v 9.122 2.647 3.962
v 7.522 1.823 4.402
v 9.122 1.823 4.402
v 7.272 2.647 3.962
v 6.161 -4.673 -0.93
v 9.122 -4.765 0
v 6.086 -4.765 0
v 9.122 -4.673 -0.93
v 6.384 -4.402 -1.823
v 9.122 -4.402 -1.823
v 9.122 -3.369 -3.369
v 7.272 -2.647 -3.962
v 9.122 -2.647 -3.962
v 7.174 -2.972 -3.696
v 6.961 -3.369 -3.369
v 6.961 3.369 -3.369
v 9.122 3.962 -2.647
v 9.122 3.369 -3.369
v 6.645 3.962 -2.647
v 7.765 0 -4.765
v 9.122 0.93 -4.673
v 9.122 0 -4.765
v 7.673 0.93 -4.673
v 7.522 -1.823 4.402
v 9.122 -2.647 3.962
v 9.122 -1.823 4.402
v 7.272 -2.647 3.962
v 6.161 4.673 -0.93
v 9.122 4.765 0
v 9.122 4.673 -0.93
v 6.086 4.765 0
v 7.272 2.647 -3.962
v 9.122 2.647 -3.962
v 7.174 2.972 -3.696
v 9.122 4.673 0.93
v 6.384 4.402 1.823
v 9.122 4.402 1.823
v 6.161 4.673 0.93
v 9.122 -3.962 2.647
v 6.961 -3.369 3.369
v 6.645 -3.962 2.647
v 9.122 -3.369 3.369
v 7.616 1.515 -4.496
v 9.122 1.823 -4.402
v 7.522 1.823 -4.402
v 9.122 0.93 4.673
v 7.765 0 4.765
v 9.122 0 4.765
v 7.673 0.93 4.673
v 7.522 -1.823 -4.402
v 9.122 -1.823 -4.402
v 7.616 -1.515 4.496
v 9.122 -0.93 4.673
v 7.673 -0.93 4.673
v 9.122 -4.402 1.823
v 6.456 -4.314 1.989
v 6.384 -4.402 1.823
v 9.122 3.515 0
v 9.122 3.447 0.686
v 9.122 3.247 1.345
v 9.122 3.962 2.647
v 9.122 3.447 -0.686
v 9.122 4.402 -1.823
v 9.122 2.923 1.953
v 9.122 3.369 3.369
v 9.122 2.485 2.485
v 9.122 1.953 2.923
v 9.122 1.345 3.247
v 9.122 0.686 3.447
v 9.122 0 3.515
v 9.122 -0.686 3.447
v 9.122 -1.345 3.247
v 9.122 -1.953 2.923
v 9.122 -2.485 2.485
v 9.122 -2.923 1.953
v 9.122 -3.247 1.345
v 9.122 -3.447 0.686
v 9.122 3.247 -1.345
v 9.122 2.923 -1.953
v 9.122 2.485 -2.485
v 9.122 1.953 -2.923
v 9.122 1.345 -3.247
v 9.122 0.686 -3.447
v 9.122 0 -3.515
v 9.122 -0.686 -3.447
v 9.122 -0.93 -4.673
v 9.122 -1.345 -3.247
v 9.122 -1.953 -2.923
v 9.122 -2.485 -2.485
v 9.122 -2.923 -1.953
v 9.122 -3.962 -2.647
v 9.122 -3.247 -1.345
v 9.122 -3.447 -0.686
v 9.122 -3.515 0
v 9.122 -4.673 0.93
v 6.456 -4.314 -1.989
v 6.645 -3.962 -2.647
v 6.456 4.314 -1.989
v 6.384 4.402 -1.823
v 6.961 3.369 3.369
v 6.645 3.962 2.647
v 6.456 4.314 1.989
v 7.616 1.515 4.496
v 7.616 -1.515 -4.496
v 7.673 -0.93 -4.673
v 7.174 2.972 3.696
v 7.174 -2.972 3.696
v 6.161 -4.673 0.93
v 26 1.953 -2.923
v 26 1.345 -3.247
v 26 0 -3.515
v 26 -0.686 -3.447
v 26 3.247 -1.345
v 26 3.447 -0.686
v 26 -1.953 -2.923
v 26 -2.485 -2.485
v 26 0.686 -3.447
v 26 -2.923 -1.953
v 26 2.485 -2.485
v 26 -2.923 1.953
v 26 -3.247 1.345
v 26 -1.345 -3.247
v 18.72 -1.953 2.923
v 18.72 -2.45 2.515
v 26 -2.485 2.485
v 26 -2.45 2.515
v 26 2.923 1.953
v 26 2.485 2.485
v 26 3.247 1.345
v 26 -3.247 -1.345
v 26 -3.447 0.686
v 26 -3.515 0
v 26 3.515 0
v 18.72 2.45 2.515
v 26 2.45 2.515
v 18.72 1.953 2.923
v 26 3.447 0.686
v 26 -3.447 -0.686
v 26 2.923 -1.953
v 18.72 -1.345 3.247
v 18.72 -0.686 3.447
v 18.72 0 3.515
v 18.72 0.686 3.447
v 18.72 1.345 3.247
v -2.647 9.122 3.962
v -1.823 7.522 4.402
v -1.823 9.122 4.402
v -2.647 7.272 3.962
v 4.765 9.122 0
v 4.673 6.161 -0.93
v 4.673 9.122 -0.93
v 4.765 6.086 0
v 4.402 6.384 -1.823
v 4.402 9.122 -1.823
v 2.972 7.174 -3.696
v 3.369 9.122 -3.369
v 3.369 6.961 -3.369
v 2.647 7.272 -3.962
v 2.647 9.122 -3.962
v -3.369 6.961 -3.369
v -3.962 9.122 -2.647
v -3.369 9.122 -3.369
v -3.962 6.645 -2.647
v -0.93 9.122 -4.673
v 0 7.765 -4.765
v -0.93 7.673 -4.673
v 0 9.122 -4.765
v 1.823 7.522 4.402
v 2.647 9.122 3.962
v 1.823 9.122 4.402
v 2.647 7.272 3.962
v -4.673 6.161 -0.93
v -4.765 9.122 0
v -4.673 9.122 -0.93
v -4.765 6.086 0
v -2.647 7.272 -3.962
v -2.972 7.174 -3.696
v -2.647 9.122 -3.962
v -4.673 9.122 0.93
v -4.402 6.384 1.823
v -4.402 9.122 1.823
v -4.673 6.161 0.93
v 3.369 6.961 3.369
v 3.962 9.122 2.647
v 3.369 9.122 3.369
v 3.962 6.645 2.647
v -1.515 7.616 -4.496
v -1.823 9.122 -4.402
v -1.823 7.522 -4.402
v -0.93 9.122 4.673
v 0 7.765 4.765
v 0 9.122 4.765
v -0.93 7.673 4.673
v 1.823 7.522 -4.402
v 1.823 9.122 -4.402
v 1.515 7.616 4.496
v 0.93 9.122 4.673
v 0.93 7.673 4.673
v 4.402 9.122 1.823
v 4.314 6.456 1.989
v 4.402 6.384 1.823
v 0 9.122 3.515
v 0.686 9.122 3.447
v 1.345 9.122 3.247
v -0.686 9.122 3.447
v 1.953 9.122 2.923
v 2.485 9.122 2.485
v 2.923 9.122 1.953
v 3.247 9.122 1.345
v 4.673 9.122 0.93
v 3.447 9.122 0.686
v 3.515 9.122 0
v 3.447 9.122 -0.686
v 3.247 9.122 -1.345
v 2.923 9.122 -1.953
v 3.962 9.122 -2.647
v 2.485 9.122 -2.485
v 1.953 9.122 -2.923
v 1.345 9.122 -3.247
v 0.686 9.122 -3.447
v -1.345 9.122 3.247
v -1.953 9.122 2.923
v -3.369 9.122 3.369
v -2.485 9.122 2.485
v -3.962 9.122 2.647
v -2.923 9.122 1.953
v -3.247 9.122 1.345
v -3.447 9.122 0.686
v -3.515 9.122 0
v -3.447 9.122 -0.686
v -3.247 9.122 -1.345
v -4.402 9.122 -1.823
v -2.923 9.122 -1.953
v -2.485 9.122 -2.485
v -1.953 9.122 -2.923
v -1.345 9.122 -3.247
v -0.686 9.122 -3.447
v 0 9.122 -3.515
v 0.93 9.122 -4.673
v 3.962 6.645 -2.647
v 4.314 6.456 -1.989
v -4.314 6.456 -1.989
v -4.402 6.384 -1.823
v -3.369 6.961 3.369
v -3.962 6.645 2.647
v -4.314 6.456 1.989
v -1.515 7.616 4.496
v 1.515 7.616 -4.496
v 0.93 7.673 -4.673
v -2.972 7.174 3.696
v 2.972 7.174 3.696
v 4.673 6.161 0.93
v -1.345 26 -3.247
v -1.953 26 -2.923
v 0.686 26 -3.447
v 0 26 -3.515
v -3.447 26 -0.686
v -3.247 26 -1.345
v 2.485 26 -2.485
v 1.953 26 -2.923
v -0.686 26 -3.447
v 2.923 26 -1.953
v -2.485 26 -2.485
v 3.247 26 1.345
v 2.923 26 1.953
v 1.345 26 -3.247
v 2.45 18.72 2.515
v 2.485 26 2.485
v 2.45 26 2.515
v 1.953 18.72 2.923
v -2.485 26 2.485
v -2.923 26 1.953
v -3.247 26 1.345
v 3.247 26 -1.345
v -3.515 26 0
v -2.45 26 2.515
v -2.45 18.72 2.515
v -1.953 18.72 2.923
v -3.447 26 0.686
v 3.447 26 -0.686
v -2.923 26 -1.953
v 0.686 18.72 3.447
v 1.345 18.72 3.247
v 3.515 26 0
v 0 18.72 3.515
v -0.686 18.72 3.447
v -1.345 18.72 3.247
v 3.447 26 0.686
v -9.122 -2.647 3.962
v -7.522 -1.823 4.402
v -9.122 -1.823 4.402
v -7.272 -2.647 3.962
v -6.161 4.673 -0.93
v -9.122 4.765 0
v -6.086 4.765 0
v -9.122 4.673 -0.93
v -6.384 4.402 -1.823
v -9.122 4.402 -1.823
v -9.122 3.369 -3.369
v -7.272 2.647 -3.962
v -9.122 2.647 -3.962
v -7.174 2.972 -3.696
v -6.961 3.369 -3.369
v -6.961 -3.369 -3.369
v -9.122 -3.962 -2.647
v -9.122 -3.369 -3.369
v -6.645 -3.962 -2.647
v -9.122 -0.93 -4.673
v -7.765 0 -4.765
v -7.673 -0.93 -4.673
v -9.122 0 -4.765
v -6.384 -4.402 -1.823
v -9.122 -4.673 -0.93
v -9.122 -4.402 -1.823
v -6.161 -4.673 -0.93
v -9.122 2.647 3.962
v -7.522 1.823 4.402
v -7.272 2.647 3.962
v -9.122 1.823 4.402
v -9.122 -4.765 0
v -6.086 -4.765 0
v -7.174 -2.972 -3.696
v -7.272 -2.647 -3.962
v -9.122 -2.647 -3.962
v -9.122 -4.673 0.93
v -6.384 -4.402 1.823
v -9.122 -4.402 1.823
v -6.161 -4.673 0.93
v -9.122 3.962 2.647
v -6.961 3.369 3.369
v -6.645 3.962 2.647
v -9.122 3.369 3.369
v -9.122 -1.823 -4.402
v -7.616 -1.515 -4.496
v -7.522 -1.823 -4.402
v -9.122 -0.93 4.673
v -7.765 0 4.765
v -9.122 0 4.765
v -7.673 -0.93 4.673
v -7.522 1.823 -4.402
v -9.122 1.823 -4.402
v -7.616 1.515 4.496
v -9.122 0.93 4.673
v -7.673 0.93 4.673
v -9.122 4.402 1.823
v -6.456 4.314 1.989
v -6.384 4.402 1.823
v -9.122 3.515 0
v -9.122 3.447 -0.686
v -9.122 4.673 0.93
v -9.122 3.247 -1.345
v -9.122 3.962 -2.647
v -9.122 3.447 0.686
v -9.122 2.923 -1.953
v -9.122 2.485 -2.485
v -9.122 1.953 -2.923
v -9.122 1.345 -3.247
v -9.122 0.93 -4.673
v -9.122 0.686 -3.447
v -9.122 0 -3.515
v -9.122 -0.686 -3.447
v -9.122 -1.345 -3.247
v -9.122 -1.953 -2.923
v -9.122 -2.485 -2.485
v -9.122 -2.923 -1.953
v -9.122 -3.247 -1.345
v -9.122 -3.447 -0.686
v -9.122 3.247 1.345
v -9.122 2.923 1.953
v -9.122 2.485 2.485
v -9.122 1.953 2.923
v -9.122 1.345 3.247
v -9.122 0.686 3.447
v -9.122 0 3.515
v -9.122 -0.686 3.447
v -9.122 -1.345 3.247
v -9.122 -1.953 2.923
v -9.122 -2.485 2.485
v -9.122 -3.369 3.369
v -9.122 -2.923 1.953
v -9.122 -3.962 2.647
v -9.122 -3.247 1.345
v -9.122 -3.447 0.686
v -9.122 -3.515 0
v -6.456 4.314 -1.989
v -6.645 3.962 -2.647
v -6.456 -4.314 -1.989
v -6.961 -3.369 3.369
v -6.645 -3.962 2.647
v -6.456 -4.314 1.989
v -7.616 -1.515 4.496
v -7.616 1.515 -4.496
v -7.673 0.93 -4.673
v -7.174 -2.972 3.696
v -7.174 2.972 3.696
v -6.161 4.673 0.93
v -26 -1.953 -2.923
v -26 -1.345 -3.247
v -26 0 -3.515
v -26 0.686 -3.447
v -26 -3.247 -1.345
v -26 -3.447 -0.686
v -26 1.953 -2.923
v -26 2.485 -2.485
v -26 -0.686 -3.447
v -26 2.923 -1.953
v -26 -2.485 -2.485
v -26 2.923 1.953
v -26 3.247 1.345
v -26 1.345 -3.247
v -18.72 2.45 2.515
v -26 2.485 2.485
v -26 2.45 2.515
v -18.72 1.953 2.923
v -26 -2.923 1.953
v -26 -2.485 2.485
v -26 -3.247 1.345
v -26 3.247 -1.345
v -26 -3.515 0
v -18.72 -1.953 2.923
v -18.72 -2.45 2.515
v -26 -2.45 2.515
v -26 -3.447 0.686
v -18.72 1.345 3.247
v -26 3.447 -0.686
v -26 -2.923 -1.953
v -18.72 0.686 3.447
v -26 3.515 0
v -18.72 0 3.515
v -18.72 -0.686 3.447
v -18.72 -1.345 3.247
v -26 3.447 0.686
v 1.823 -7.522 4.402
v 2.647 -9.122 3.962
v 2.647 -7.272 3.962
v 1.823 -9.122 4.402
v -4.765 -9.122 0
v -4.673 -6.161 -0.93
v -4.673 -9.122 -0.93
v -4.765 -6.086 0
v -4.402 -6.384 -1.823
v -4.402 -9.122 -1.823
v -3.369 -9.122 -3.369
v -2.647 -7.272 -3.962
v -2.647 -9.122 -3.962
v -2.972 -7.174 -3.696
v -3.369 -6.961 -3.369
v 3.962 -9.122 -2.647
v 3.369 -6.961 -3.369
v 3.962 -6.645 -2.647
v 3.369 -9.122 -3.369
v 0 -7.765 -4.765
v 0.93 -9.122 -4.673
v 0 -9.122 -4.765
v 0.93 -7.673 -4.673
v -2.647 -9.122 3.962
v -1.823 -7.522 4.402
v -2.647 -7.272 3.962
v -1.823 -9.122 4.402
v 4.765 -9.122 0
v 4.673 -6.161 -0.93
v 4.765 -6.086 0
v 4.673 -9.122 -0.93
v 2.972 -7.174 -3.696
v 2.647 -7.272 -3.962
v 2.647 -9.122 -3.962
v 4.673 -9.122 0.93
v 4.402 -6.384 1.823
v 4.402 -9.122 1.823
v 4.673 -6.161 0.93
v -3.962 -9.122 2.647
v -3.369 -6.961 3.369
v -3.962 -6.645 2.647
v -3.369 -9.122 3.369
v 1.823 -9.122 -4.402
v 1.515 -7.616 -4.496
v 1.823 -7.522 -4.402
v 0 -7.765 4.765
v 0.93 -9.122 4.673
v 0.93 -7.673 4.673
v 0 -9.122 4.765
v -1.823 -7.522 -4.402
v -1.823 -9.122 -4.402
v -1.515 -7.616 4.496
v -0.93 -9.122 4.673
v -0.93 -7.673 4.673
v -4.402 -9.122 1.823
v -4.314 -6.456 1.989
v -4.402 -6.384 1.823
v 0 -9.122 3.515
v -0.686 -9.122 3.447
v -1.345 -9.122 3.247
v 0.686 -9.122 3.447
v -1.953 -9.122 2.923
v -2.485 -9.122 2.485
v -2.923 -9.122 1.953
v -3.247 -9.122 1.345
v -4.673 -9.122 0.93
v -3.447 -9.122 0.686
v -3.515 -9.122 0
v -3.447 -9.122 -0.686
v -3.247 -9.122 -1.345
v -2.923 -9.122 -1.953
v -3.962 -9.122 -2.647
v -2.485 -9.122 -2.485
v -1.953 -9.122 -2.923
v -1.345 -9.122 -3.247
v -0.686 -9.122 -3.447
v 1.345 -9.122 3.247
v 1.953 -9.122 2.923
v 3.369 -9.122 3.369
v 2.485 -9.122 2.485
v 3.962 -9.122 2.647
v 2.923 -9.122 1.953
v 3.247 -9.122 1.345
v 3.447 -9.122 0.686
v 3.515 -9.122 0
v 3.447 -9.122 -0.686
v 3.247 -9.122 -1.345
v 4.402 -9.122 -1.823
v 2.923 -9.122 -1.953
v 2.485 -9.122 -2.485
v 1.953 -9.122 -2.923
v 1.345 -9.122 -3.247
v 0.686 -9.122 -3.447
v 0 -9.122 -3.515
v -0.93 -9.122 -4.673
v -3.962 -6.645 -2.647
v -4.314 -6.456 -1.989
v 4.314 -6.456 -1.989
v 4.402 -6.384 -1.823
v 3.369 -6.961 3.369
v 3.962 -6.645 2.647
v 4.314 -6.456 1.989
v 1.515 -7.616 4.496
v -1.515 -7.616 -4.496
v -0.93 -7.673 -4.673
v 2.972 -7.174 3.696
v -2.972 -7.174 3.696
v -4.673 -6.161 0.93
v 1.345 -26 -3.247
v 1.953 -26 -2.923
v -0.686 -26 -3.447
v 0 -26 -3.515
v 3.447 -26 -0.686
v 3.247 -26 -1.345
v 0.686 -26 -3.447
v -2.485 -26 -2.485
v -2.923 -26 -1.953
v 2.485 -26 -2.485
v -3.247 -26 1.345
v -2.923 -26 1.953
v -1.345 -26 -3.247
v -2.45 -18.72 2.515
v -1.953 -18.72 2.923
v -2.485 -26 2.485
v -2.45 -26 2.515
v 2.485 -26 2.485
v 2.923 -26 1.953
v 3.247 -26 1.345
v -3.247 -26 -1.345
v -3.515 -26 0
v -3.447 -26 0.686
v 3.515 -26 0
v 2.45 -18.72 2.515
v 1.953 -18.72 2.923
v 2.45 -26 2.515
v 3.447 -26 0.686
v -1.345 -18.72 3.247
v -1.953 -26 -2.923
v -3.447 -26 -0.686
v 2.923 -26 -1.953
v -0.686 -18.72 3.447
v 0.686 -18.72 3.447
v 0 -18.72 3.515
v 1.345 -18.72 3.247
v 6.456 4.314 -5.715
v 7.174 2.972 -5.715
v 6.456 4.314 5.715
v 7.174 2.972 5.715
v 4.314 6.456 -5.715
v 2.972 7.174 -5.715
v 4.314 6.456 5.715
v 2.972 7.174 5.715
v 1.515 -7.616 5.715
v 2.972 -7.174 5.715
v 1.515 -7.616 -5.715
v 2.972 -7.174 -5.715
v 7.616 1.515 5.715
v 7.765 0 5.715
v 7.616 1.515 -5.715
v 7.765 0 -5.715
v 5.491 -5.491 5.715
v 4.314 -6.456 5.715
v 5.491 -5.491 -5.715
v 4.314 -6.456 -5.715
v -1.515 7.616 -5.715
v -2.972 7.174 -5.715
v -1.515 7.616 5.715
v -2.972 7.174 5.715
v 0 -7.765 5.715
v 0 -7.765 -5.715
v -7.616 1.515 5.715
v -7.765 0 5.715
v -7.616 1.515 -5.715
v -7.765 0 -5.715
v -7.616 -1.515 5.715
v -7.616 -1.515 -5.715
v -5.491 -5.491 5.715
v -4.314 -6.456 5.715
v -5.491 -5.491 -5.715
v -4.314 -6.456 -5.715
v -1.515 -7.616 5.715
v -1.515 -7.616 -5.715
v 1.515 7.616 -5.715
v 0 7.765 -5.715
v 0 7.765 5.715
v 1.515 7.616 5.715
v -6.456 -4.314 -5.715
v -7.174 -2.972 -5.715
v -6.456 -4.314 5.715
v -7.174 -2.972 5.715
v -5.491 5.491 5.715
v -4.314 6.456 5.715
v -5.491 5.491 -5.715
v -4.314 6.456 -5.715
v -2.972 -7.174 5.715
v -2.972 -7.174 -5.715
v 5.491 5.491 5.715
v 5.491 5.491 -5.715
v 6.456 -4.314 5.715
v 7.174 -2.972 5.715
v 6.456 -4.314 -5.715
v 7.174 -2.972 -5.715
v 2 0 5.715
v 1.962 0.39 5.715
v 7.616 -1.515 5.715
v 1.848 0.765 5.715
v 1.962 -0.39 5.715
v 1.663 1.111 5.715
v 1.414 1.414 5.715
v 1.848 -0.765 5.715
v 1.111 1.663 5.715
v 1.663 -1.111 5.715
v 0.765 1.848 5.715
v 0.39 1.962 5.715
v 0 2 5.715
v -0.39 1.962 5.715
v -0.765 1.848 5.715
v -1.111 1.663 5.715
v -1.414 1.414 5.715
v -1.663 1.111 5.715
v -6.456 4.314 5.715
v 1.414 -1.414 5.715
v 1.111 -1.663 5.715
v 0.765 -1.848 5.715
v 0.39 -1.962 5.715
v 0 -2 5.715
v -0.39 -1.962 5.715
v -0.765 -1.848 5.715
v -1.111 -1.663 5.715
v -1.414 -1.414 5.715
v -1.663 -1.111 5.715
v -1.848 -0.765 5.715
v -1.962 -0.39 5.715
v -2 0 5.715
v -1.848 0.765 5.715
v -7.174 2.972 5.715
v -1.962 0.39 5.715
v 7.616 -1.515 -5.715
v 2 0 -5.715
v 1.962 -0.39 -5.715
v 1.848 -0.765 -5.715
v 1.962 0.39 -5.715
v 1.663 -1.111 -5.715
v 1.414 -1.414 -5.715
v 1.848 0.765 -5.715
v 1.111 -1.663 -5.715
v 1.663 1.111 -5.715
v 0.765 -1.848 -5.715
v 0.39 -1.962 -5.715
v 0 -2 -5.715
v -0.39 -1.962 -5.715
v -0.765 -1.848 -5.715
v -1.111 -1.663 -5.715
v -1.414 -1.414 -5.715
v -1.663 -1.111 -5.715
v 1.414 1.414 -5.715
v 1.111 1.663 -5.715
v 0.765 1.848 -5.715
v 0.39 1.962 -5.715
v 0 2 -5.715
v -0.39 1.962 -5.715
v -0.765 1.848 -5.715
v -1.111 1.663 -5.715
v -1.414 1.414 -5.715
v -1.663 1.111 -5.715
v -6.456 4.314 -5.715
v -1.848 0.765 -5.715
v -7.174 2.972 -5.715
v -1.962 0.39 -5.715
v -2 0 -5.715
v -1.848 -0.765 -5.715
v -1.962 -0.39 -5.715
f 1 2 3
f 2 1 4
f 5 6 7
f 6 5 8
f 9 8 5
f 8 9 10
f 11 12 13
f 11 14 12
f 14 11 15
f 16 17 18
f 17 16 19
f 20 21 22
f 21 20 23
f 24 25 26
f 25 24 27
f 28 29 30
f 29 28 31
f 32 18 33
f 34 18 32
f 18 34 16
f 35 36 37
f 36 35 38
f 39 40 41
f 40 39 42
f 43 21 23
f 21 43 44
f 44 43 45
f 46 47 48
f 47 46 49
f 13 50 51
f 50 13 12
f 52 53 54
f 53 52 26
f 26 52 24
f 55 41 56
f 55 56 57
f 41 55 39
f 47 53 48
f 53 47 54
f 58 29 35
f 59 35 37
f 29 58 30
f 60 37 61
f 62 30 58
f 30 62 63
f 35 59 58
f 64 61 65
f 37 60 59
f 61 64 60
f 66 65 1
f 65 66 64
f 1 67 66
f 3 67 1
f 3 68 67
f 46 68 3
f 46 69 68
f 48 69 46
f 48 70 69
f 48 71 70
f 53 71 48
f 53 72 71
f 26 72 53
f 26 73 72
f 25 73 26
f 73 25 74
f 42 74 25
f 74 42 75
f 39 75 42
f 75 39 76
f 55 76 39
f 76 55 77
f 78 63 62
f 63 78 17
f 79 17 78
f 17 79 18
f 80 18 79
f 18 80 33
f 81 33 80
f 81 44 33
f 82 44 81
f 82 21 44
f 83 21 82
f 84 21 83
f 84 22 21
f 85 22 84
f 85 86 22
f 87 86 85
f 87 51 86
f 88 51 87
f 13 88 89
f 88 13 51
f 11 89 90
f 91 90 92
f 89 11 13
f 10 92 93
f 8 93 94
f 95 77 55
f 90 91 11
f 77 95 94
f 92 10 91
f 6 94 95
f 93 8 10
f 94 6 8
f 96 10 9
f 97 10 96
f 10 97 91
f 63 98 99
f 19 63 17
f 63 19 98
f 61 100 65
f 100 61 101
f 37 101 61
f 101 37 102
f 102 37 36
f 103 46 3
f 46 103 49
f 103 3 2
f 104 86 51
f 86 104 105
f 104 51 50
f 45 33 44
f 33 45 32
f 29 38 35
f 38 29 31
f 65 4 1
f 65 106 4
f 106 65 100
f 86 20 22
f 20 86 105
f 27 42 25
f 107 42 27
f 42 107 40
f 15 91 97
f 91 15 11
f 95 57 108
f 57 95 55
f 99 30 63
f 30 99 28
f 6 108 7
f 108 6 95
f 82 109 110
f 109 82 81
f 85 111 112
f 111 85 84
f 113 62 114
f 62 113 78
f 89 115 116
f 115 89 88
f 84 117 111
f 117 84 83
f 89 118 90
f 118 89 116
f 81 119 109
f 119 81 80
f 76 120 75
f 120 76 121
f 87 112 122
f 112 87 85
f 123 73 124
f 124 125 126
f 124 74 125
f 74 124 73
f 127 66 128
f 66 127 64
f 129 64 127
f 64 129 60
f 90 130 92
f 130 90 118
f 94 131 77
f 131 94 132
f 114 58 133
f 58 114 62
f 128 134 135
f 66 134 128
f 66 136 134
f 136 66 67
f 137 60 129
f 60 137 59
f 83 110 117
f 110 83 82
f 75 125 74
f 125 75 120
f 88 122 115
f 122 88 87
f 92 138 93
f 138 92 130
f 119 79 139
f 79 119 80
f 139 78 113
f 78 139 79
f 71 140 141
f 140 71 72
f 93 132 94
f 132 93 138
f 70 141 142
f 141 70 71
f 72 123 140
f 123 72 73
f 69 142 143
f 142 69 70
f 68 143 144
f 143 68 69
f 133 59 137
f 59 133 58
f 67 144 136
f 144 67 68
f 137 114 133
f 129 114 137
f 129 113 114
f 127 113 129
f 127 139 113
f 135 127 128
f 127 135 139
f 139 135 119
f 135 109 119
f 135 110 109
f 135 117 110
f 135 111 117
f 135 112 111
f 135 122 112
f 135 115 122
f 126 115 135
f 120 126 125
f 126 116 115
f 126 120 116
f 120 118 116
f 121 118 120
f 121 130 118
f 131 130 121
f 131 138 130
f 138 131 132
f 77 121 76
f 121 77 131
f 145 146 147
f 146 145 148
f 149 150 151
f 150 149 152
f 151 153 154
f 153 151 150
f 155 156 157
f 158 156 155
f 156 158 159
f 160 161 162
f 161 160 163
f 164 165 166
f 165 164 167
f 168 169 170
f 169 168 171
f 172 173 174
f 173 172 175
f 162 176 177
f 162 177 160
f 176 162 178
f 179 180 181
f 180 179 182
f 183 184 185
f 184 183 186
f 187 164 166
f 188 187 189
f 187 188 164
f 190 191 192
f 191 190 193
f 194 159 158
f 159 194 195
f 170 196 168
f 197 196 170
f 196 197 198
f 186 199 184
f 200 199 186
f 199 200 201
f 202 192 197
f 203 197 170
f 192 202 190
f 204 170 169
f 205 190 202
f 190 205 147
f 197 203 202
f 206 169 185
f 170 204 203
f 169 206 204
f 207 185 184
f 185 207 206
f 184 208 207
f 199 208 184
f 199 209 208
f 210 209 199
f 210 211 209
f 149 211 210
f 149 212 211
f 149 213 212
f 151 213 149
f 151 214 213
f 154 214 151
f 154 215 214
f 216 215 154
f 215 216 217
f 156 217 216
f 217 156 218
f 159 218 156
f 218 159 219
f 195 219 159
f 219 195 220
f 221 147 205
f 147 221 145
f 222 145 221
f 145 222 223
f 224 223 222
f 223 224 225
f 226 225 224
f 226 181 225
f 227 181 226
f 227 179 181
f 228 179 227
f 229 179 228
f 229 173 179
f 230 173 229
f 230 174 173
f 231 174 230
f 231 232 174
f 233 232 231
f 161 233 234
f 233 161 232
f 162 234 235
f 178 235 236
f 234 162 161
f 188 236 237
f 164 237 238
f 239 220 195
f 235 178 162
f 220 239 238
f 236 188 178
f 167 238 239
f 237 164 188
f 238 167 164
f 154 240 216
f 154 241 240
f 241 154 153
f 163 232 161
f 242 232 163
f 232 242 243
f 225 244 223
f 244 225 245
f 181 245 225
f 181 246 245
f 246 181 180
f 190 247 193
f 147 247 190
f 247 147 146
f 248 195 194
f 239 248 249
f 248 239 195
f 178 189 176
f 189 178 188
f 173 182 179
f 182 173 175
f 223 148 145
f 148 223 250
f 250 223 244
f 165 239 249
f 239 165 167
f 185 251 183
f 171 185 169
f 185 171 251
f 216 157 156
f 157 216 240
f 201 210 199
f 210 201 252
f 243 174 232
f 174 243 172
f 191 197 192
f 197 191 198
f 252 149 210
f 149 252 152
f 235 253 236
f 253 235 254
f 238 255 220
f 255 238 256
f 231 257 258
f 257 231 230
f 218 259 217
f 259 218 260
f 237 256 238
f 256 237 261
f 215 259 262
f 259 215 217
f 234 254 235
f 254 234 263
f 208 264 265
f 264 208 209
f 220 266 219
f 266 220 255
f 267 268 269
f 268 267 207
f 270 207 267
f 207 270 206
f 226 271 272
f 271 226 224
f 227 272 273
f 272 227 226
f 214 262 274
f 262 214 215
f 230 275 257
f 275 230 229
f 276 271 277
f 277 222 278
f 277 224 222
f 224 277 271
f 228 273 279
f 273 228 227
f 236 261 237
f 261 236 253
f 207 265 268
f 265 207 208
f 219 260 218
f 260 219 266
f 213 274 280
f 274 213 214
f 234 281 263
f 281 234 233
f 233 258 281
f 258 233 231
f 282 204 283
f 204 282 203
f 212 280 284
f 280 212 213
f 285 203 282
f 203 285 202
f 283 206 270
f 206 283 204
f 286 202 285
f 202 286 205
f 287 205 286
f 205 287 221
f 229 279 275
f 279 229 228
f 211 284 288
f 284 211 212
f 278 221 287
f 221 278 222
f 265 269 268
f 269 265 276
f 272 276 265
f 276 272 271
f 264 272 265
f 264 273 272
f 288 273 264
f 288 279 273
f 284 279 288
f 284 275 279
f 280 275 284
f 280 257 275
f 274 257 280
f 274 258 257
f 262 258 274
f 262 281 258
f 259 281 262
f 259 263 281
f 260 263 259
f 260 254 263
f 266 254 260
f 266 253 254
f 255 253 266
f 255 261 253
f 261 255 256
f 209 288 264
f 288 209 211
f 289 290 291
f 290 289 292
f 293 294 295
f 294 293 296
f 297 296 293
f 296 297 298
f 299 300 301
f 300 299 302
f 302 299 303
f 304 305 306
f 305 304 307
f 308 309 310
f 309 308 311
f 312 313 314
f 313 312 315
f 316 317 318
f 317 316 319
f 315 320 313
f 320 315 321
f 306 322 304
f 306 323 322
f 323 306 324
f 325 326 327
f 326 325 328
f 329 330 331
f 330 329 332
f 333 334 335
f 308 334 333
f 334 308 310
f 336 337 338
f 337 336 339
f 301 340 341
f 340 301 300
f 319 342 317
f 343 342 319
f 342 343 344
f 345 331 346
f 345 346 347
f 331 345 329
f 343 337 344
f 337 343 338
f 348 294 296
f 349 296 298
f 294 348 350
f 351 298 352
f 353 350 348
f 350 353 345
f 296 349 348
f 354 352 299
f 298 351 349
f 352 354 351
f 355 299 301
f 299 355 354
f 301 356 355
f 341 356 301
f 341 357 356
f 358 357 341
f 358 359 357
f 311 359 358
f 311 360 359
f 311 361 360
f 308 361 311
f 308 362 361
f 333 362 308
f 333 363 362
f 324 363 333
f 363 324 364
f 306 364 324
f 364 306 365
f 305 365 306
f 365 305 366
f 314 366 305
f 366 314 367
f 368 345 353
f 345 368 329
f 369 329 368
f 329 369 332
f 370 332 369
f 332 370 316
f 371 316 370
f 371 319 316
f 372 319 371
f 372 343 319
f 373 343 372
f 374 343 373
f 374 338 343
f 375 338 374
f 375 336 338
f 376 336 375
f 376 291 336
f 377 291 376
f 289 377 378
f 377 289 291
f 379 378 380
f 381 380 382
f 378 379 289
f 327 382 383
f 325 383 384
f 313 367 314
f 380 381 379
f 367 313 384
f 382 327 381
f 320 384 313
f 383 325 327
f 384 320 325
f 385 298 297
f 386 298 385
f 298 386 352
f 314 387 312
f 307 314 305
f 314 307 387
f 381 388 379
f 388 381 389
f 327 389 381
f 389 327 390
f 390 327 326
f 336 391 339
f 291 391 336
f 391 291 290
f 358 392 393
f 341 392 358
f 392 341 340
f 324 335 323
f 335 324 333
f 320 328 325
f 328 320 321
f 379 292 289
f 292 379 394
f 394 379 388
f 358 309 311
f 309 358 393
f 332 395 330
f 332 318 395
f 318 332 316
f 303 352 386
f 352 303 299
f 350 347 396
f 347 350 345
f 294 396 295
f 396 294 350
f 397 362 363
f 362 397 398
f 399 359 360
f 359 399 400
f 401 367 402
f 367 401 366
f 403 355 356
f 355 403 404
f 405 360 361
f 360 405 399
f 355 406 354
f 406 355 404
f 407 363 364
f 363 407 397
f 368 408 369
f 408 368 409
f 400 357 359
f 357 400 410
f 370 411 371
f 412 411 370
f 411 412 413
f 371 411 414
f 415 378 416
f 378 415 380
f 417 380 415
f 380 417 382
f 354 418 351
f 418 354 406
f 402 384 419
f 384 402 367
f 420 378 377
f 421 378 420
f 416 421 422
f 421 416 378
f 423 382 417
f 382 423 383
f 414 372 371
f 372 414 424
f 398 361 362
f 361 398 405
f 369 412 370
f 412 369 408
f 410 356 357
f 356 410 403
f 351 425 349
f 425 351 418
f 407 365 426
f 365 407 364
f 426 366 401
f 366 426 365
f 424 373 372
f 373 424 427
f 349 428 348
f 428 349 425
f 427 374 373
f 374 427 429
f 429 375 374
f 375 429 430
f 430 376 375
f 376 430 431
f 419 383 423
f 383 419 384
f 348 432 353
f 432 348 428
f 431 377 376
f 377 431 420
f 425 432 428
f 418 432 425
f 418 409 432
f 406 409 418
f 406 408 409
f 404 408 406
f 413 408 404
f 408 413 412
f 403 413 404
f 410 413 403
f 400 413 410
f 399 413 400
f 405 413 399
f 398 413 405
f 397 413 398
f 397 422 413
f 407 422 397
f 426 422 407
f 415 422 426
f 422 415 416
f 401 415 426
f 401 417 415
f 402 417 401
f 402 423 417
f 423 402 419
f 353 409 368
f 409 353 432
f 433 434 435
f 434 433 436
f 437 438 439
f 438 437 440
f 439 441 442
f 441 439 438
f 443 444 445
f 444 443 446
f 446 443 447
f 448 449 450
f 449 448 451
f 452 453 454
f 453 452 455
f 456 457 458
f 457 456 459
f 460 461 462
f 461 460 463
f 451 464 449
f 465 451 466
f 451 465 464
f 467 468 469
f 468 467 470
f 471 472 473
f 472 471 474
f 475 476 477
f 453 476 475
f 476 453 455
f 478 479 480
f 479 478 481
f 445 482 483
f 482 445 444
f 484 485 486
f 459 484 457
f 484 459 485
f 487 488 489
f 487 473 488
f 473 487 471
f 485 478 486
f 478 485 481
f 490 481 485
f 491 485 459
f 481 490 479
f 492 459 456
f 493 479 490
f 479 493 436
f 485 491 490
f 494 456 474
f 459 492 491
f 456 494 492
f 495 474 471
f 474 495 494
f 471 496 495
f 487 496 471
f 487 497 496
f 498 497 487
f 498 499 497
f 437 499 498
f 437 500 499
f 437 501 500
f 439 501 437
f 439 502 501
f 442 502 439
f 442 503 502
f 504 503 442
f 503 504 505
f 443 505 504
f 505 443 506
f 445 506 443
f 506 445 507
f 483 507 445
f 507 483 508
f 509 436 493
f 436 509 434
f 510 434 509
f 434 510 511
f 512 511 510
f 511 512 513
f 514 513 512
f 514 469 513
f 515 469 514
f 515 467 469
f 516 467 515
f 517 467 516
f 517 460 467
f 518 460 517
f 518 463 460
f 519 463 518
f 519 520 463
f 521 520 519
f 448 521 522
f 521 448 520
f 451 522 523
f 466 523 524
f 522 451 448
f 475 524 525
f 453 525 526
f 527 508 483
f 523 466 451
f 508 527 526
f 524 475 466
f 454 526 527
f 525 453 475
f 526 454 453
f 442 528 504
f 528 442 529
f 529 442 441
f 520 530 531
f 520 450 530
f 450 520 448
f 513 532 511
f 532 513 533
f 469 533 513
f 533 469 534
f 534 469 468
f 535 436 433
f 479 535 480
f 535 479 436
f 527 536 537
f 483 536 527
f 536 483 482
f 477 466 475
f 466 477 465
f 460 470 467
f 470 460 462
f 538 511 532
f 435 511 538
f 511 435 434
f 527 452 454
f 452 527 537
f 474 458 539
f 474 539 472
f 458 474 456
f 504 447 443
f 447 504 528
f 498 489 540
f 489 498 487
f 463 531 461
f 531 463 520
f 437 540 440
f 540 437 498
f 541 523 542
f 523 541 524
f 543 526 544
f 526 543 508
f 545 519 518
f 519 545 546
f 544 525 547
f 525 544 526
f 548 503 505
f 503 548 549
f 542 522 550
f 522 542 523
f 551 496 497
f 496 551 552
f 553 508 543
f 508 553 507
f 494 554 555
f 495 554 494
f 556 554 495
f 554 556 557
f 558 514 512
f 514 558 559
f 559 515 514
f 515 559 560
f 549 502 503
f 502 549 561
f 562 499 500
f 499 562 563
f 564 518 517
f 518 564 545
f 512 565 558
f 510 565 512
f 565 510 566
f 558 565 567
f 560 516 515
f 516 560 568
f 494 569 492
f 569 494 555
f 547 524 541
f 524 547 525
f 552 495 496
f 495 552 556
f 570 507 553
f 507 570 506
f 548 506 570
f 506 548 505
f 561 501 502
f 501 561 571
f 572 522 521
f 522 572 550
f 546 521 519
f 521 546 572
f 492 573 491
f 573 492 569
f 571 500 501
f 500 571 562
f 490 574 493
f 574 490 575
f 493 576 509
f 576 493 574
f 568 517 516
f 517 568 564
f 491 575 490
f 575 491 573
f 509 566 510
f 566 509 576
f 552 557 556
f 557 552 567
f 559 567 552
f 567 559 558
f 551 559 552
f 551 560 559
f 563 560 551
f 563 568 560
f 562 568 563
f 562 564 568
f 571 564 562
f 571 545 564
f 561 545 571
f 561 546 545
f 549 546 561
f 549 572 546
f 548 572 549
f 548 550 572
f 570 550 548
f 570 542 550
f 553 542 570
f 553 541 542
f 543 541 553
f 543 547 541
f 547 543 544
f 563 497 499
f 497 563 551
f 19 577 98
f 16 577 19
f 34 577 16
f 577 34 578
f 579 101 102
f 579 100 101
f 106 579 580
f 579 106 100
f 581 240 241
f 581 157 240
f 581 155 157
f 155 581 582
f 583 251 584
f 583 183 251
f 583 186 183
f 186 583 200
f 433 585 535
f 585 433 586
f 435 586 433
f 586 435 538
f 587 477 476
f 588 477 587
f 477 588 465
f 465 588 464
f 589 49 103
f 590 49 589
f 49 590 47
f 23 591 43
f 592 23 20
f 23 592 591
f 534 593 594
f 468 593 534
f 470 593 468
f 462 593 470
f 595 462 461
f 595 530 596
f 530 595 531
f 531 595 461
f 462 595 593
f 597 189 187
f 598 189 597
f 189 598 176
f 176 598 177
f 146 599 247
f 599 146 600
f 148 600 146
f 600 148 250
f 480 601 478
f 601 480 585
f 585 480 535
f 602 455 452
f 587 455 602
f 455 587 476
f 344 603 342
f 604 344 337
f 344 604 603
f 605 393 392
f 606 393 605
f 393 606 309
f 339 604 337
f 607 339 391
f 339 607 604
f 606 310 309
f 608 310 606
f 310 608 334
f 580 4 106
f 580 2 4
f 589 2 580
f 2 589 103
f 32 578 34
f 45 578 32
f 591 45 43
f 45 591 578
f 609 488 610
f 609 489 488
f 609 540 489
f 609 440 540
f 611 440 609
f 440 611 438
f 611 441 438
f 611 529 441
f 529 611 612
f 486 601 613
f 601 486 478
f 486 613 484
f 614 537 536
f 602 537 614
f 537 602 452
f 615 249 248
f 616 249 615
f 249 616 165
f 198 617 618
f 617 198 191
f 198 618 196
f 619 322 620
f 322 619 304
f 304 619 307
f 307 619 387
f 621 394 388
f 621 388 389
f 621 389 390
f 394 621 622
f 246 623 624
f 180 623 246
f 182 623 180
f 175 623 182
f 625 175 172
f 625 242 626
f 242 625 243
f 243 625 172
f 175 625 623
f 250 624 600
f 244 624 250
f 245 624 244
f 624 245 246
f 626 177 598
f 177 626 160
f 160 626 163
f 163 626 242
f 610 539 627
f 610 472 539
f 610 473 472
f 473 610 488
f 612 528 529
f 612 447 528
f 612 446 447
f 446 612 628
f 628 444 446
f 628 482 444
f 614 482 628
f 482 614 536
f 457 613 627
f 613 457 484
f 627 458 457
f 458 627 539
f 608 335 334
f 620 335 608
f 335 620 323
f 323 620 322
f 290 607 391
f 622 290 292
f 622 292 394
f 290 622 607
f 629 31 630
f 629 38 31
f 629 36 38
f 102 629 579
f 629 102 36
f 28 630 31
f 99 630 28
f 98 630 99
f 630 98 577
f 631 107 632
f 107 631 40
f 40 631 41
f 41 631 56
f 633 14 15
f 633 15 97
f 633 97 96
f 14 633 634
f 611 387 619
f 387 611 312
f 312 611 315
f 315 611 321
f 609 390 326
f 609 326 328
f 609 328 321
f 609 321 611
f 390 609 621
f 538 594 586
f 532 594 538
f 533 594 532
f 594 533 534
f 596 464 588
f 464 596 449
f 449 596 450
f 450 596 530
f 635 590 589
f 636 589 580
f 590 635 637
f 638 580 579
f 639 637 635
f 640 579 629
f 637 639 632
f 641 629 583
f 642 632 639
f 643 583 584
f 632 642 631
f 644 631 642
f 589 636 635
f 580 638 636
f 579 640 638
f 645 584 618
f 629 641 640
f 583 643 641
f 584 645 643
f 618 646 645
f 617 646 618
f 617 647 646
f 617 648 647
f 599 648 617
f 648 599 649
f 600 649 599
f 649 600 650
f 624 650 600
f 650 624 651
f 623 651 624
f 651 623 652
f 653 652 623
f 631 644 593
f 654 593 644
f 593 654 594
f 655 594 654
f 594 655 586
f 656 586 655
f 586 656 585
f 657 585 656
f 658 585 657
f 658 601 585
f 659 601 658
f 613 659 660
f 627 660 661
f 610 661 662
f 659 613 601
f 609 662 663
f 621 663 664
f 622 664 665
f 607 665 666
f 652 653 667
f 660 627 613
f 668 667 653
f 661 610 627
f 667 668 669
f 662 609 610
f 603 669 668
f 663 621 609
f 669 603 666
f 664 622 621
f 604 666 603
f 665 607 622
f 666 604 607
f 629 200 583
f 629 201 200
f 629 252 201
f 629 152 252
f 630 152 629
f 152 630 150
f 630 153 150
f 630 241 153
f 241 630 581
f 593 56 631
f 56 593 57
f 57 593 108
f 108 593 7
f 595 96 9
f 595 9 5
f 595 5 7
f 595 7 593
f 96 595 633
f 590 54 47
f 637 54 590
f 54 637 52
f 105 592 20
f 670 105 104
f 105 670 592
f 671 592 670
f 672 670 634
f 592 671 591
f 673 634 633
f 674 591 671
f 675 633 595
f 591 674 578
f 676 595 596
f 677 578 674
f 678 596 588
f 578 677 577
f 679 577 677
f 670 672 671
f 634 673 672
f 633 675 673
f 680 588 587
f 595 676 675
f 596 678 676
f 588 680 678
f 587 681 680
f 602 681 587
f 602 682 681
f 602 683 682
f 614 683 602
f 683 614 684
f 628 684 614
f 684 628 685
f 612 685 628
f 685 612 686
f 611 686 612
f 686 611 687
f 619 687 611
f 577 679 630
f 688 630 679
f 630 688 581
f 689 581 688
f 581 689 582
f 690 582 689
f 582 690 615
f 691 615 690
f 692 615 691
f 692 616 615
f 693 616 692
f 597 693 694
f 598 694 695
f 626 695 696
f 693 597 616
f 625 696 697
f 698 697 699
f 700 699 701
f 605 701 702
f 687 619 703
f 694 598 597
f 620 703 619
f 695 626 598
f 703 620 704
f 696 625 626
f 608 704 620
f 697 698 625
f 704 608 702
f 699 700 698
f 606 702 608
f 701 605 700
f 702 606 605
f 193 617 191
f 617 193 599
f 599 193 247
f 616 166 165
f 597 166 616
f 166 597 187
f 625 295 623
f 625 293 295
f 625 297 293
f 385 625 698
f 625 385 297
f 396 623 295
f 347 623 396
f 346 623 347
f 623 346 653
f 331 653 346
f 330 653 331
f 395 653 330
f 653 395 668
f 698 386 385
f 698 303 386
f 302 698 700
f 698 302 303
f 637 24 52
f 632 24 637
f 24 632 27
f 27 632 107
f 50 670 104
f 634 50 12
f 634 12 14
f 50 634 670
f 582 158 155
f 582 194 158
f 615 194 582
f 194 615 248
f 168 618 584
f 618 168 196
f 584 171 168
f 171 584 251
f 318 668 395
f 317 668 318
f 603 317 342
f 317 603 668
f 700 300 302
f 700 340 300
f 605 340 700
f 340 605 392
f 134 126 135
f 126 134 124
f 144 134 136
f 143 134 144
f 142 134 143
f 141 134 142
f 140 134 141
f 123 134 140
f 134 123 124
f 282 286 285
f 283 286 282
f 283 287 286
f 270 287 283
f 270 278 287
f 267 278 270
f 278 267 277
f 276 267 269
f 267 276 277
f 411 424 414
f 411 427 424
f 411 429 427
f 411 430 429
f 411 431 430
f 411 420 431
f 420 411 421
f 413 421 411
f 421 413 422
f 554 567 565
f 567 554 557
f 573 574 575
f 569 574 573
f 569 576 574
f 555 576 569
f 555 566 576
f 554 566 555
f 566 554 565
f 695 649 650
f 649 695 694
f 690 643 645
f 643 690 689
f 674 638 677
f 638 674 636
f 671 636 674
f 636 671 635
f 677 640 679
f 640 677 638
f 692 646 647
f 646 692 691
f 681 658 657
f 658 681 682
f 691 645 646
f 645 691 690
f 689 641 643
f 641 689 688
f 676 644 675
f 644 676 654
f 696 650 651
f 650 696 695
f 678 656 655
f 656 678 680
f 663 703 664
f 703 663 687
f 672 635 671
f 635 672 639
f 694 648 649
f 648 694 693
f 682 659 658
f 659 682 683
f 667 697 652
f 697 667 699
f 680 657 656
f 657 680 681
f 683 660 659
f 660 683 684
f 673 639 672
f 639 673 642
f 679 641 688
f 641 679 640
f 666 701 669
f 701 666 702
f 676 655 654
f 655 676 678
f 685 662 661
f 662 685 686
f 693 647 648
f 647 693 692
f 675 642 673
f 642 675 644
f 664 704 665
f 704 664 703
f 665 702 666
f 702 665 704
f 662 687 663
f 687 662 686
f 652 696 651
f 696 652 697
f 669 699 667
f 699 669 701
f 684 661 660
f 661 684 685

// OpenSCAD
$fn = 32;

// ----------------------------------------------------------------------
// Cardan cross: 52 mm span, 9.53 mm trunnions
// ----------------------------------------------------------------------

// --- parameters (mm) ---
journal_d = 9.53;         // trunnion diameter
arm_len = 26;             // trunnion length from the centre
step_r = 3.24;            // step position from the centre
step_d = 7.03;            // journal diameter after the step
hub_d = 15.53;            // hub diameter
hub_h = 11.43;            // hub height
bore_d = 4;               // hub bore
flat_d = 1;               // depth of the journal flat
flat_len = 7.28;          // length of the journal flat

difference() {
  union() {
    /* hub along the joint axis */
    cylinder(h = hub_h, d = hub_d, center = true);
    for (a = [0 : 90 : 270]) rotate([0, 0, a]) {
      /* trunnion, sunk into the hub */
      translate([hub_d / 4, 0, 0]) rotate([0, 90, 0]) cylinder(h = step_r + 2, d = journal_d);
      /* stepped journal out to the tip */
      translate([step_r - 0.5, 0, 0]) rotate([0, 90, 0]) cylinder(h = arm_len + 0.5 - step_r, d = step_d);
    }
  }
  /* lubrication bore through the hub, 2.5 mm clear on both sides */
  translate([0, 0, -hub_h / 2 - 2.5]) cylinder(h = hub_h + 5, d = bore_d);
  /* machined flat on each journal tip */
  for (a = [0 : 90 : 270]) rotate([0, 0, a]) {
    translate([arm_len - flat_len, -step_d, step_d / 2 - flat_d]) cube([flat_len + 0.5, 2 * step_d, flat_d + 2.5]);
  }
}
